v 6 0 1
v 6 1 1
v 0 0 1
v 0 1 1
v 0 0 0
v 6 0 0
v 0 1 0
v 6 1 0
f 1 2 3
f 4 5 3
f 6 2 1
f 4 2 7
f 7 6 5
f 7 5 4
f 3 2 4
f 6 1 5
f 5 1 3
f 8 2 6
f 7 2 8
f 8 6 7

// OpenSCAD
hull() {
  cube([1, 1, 1]);
  translate([5, 0, 0]) cube([1, 1, 1]);
}
